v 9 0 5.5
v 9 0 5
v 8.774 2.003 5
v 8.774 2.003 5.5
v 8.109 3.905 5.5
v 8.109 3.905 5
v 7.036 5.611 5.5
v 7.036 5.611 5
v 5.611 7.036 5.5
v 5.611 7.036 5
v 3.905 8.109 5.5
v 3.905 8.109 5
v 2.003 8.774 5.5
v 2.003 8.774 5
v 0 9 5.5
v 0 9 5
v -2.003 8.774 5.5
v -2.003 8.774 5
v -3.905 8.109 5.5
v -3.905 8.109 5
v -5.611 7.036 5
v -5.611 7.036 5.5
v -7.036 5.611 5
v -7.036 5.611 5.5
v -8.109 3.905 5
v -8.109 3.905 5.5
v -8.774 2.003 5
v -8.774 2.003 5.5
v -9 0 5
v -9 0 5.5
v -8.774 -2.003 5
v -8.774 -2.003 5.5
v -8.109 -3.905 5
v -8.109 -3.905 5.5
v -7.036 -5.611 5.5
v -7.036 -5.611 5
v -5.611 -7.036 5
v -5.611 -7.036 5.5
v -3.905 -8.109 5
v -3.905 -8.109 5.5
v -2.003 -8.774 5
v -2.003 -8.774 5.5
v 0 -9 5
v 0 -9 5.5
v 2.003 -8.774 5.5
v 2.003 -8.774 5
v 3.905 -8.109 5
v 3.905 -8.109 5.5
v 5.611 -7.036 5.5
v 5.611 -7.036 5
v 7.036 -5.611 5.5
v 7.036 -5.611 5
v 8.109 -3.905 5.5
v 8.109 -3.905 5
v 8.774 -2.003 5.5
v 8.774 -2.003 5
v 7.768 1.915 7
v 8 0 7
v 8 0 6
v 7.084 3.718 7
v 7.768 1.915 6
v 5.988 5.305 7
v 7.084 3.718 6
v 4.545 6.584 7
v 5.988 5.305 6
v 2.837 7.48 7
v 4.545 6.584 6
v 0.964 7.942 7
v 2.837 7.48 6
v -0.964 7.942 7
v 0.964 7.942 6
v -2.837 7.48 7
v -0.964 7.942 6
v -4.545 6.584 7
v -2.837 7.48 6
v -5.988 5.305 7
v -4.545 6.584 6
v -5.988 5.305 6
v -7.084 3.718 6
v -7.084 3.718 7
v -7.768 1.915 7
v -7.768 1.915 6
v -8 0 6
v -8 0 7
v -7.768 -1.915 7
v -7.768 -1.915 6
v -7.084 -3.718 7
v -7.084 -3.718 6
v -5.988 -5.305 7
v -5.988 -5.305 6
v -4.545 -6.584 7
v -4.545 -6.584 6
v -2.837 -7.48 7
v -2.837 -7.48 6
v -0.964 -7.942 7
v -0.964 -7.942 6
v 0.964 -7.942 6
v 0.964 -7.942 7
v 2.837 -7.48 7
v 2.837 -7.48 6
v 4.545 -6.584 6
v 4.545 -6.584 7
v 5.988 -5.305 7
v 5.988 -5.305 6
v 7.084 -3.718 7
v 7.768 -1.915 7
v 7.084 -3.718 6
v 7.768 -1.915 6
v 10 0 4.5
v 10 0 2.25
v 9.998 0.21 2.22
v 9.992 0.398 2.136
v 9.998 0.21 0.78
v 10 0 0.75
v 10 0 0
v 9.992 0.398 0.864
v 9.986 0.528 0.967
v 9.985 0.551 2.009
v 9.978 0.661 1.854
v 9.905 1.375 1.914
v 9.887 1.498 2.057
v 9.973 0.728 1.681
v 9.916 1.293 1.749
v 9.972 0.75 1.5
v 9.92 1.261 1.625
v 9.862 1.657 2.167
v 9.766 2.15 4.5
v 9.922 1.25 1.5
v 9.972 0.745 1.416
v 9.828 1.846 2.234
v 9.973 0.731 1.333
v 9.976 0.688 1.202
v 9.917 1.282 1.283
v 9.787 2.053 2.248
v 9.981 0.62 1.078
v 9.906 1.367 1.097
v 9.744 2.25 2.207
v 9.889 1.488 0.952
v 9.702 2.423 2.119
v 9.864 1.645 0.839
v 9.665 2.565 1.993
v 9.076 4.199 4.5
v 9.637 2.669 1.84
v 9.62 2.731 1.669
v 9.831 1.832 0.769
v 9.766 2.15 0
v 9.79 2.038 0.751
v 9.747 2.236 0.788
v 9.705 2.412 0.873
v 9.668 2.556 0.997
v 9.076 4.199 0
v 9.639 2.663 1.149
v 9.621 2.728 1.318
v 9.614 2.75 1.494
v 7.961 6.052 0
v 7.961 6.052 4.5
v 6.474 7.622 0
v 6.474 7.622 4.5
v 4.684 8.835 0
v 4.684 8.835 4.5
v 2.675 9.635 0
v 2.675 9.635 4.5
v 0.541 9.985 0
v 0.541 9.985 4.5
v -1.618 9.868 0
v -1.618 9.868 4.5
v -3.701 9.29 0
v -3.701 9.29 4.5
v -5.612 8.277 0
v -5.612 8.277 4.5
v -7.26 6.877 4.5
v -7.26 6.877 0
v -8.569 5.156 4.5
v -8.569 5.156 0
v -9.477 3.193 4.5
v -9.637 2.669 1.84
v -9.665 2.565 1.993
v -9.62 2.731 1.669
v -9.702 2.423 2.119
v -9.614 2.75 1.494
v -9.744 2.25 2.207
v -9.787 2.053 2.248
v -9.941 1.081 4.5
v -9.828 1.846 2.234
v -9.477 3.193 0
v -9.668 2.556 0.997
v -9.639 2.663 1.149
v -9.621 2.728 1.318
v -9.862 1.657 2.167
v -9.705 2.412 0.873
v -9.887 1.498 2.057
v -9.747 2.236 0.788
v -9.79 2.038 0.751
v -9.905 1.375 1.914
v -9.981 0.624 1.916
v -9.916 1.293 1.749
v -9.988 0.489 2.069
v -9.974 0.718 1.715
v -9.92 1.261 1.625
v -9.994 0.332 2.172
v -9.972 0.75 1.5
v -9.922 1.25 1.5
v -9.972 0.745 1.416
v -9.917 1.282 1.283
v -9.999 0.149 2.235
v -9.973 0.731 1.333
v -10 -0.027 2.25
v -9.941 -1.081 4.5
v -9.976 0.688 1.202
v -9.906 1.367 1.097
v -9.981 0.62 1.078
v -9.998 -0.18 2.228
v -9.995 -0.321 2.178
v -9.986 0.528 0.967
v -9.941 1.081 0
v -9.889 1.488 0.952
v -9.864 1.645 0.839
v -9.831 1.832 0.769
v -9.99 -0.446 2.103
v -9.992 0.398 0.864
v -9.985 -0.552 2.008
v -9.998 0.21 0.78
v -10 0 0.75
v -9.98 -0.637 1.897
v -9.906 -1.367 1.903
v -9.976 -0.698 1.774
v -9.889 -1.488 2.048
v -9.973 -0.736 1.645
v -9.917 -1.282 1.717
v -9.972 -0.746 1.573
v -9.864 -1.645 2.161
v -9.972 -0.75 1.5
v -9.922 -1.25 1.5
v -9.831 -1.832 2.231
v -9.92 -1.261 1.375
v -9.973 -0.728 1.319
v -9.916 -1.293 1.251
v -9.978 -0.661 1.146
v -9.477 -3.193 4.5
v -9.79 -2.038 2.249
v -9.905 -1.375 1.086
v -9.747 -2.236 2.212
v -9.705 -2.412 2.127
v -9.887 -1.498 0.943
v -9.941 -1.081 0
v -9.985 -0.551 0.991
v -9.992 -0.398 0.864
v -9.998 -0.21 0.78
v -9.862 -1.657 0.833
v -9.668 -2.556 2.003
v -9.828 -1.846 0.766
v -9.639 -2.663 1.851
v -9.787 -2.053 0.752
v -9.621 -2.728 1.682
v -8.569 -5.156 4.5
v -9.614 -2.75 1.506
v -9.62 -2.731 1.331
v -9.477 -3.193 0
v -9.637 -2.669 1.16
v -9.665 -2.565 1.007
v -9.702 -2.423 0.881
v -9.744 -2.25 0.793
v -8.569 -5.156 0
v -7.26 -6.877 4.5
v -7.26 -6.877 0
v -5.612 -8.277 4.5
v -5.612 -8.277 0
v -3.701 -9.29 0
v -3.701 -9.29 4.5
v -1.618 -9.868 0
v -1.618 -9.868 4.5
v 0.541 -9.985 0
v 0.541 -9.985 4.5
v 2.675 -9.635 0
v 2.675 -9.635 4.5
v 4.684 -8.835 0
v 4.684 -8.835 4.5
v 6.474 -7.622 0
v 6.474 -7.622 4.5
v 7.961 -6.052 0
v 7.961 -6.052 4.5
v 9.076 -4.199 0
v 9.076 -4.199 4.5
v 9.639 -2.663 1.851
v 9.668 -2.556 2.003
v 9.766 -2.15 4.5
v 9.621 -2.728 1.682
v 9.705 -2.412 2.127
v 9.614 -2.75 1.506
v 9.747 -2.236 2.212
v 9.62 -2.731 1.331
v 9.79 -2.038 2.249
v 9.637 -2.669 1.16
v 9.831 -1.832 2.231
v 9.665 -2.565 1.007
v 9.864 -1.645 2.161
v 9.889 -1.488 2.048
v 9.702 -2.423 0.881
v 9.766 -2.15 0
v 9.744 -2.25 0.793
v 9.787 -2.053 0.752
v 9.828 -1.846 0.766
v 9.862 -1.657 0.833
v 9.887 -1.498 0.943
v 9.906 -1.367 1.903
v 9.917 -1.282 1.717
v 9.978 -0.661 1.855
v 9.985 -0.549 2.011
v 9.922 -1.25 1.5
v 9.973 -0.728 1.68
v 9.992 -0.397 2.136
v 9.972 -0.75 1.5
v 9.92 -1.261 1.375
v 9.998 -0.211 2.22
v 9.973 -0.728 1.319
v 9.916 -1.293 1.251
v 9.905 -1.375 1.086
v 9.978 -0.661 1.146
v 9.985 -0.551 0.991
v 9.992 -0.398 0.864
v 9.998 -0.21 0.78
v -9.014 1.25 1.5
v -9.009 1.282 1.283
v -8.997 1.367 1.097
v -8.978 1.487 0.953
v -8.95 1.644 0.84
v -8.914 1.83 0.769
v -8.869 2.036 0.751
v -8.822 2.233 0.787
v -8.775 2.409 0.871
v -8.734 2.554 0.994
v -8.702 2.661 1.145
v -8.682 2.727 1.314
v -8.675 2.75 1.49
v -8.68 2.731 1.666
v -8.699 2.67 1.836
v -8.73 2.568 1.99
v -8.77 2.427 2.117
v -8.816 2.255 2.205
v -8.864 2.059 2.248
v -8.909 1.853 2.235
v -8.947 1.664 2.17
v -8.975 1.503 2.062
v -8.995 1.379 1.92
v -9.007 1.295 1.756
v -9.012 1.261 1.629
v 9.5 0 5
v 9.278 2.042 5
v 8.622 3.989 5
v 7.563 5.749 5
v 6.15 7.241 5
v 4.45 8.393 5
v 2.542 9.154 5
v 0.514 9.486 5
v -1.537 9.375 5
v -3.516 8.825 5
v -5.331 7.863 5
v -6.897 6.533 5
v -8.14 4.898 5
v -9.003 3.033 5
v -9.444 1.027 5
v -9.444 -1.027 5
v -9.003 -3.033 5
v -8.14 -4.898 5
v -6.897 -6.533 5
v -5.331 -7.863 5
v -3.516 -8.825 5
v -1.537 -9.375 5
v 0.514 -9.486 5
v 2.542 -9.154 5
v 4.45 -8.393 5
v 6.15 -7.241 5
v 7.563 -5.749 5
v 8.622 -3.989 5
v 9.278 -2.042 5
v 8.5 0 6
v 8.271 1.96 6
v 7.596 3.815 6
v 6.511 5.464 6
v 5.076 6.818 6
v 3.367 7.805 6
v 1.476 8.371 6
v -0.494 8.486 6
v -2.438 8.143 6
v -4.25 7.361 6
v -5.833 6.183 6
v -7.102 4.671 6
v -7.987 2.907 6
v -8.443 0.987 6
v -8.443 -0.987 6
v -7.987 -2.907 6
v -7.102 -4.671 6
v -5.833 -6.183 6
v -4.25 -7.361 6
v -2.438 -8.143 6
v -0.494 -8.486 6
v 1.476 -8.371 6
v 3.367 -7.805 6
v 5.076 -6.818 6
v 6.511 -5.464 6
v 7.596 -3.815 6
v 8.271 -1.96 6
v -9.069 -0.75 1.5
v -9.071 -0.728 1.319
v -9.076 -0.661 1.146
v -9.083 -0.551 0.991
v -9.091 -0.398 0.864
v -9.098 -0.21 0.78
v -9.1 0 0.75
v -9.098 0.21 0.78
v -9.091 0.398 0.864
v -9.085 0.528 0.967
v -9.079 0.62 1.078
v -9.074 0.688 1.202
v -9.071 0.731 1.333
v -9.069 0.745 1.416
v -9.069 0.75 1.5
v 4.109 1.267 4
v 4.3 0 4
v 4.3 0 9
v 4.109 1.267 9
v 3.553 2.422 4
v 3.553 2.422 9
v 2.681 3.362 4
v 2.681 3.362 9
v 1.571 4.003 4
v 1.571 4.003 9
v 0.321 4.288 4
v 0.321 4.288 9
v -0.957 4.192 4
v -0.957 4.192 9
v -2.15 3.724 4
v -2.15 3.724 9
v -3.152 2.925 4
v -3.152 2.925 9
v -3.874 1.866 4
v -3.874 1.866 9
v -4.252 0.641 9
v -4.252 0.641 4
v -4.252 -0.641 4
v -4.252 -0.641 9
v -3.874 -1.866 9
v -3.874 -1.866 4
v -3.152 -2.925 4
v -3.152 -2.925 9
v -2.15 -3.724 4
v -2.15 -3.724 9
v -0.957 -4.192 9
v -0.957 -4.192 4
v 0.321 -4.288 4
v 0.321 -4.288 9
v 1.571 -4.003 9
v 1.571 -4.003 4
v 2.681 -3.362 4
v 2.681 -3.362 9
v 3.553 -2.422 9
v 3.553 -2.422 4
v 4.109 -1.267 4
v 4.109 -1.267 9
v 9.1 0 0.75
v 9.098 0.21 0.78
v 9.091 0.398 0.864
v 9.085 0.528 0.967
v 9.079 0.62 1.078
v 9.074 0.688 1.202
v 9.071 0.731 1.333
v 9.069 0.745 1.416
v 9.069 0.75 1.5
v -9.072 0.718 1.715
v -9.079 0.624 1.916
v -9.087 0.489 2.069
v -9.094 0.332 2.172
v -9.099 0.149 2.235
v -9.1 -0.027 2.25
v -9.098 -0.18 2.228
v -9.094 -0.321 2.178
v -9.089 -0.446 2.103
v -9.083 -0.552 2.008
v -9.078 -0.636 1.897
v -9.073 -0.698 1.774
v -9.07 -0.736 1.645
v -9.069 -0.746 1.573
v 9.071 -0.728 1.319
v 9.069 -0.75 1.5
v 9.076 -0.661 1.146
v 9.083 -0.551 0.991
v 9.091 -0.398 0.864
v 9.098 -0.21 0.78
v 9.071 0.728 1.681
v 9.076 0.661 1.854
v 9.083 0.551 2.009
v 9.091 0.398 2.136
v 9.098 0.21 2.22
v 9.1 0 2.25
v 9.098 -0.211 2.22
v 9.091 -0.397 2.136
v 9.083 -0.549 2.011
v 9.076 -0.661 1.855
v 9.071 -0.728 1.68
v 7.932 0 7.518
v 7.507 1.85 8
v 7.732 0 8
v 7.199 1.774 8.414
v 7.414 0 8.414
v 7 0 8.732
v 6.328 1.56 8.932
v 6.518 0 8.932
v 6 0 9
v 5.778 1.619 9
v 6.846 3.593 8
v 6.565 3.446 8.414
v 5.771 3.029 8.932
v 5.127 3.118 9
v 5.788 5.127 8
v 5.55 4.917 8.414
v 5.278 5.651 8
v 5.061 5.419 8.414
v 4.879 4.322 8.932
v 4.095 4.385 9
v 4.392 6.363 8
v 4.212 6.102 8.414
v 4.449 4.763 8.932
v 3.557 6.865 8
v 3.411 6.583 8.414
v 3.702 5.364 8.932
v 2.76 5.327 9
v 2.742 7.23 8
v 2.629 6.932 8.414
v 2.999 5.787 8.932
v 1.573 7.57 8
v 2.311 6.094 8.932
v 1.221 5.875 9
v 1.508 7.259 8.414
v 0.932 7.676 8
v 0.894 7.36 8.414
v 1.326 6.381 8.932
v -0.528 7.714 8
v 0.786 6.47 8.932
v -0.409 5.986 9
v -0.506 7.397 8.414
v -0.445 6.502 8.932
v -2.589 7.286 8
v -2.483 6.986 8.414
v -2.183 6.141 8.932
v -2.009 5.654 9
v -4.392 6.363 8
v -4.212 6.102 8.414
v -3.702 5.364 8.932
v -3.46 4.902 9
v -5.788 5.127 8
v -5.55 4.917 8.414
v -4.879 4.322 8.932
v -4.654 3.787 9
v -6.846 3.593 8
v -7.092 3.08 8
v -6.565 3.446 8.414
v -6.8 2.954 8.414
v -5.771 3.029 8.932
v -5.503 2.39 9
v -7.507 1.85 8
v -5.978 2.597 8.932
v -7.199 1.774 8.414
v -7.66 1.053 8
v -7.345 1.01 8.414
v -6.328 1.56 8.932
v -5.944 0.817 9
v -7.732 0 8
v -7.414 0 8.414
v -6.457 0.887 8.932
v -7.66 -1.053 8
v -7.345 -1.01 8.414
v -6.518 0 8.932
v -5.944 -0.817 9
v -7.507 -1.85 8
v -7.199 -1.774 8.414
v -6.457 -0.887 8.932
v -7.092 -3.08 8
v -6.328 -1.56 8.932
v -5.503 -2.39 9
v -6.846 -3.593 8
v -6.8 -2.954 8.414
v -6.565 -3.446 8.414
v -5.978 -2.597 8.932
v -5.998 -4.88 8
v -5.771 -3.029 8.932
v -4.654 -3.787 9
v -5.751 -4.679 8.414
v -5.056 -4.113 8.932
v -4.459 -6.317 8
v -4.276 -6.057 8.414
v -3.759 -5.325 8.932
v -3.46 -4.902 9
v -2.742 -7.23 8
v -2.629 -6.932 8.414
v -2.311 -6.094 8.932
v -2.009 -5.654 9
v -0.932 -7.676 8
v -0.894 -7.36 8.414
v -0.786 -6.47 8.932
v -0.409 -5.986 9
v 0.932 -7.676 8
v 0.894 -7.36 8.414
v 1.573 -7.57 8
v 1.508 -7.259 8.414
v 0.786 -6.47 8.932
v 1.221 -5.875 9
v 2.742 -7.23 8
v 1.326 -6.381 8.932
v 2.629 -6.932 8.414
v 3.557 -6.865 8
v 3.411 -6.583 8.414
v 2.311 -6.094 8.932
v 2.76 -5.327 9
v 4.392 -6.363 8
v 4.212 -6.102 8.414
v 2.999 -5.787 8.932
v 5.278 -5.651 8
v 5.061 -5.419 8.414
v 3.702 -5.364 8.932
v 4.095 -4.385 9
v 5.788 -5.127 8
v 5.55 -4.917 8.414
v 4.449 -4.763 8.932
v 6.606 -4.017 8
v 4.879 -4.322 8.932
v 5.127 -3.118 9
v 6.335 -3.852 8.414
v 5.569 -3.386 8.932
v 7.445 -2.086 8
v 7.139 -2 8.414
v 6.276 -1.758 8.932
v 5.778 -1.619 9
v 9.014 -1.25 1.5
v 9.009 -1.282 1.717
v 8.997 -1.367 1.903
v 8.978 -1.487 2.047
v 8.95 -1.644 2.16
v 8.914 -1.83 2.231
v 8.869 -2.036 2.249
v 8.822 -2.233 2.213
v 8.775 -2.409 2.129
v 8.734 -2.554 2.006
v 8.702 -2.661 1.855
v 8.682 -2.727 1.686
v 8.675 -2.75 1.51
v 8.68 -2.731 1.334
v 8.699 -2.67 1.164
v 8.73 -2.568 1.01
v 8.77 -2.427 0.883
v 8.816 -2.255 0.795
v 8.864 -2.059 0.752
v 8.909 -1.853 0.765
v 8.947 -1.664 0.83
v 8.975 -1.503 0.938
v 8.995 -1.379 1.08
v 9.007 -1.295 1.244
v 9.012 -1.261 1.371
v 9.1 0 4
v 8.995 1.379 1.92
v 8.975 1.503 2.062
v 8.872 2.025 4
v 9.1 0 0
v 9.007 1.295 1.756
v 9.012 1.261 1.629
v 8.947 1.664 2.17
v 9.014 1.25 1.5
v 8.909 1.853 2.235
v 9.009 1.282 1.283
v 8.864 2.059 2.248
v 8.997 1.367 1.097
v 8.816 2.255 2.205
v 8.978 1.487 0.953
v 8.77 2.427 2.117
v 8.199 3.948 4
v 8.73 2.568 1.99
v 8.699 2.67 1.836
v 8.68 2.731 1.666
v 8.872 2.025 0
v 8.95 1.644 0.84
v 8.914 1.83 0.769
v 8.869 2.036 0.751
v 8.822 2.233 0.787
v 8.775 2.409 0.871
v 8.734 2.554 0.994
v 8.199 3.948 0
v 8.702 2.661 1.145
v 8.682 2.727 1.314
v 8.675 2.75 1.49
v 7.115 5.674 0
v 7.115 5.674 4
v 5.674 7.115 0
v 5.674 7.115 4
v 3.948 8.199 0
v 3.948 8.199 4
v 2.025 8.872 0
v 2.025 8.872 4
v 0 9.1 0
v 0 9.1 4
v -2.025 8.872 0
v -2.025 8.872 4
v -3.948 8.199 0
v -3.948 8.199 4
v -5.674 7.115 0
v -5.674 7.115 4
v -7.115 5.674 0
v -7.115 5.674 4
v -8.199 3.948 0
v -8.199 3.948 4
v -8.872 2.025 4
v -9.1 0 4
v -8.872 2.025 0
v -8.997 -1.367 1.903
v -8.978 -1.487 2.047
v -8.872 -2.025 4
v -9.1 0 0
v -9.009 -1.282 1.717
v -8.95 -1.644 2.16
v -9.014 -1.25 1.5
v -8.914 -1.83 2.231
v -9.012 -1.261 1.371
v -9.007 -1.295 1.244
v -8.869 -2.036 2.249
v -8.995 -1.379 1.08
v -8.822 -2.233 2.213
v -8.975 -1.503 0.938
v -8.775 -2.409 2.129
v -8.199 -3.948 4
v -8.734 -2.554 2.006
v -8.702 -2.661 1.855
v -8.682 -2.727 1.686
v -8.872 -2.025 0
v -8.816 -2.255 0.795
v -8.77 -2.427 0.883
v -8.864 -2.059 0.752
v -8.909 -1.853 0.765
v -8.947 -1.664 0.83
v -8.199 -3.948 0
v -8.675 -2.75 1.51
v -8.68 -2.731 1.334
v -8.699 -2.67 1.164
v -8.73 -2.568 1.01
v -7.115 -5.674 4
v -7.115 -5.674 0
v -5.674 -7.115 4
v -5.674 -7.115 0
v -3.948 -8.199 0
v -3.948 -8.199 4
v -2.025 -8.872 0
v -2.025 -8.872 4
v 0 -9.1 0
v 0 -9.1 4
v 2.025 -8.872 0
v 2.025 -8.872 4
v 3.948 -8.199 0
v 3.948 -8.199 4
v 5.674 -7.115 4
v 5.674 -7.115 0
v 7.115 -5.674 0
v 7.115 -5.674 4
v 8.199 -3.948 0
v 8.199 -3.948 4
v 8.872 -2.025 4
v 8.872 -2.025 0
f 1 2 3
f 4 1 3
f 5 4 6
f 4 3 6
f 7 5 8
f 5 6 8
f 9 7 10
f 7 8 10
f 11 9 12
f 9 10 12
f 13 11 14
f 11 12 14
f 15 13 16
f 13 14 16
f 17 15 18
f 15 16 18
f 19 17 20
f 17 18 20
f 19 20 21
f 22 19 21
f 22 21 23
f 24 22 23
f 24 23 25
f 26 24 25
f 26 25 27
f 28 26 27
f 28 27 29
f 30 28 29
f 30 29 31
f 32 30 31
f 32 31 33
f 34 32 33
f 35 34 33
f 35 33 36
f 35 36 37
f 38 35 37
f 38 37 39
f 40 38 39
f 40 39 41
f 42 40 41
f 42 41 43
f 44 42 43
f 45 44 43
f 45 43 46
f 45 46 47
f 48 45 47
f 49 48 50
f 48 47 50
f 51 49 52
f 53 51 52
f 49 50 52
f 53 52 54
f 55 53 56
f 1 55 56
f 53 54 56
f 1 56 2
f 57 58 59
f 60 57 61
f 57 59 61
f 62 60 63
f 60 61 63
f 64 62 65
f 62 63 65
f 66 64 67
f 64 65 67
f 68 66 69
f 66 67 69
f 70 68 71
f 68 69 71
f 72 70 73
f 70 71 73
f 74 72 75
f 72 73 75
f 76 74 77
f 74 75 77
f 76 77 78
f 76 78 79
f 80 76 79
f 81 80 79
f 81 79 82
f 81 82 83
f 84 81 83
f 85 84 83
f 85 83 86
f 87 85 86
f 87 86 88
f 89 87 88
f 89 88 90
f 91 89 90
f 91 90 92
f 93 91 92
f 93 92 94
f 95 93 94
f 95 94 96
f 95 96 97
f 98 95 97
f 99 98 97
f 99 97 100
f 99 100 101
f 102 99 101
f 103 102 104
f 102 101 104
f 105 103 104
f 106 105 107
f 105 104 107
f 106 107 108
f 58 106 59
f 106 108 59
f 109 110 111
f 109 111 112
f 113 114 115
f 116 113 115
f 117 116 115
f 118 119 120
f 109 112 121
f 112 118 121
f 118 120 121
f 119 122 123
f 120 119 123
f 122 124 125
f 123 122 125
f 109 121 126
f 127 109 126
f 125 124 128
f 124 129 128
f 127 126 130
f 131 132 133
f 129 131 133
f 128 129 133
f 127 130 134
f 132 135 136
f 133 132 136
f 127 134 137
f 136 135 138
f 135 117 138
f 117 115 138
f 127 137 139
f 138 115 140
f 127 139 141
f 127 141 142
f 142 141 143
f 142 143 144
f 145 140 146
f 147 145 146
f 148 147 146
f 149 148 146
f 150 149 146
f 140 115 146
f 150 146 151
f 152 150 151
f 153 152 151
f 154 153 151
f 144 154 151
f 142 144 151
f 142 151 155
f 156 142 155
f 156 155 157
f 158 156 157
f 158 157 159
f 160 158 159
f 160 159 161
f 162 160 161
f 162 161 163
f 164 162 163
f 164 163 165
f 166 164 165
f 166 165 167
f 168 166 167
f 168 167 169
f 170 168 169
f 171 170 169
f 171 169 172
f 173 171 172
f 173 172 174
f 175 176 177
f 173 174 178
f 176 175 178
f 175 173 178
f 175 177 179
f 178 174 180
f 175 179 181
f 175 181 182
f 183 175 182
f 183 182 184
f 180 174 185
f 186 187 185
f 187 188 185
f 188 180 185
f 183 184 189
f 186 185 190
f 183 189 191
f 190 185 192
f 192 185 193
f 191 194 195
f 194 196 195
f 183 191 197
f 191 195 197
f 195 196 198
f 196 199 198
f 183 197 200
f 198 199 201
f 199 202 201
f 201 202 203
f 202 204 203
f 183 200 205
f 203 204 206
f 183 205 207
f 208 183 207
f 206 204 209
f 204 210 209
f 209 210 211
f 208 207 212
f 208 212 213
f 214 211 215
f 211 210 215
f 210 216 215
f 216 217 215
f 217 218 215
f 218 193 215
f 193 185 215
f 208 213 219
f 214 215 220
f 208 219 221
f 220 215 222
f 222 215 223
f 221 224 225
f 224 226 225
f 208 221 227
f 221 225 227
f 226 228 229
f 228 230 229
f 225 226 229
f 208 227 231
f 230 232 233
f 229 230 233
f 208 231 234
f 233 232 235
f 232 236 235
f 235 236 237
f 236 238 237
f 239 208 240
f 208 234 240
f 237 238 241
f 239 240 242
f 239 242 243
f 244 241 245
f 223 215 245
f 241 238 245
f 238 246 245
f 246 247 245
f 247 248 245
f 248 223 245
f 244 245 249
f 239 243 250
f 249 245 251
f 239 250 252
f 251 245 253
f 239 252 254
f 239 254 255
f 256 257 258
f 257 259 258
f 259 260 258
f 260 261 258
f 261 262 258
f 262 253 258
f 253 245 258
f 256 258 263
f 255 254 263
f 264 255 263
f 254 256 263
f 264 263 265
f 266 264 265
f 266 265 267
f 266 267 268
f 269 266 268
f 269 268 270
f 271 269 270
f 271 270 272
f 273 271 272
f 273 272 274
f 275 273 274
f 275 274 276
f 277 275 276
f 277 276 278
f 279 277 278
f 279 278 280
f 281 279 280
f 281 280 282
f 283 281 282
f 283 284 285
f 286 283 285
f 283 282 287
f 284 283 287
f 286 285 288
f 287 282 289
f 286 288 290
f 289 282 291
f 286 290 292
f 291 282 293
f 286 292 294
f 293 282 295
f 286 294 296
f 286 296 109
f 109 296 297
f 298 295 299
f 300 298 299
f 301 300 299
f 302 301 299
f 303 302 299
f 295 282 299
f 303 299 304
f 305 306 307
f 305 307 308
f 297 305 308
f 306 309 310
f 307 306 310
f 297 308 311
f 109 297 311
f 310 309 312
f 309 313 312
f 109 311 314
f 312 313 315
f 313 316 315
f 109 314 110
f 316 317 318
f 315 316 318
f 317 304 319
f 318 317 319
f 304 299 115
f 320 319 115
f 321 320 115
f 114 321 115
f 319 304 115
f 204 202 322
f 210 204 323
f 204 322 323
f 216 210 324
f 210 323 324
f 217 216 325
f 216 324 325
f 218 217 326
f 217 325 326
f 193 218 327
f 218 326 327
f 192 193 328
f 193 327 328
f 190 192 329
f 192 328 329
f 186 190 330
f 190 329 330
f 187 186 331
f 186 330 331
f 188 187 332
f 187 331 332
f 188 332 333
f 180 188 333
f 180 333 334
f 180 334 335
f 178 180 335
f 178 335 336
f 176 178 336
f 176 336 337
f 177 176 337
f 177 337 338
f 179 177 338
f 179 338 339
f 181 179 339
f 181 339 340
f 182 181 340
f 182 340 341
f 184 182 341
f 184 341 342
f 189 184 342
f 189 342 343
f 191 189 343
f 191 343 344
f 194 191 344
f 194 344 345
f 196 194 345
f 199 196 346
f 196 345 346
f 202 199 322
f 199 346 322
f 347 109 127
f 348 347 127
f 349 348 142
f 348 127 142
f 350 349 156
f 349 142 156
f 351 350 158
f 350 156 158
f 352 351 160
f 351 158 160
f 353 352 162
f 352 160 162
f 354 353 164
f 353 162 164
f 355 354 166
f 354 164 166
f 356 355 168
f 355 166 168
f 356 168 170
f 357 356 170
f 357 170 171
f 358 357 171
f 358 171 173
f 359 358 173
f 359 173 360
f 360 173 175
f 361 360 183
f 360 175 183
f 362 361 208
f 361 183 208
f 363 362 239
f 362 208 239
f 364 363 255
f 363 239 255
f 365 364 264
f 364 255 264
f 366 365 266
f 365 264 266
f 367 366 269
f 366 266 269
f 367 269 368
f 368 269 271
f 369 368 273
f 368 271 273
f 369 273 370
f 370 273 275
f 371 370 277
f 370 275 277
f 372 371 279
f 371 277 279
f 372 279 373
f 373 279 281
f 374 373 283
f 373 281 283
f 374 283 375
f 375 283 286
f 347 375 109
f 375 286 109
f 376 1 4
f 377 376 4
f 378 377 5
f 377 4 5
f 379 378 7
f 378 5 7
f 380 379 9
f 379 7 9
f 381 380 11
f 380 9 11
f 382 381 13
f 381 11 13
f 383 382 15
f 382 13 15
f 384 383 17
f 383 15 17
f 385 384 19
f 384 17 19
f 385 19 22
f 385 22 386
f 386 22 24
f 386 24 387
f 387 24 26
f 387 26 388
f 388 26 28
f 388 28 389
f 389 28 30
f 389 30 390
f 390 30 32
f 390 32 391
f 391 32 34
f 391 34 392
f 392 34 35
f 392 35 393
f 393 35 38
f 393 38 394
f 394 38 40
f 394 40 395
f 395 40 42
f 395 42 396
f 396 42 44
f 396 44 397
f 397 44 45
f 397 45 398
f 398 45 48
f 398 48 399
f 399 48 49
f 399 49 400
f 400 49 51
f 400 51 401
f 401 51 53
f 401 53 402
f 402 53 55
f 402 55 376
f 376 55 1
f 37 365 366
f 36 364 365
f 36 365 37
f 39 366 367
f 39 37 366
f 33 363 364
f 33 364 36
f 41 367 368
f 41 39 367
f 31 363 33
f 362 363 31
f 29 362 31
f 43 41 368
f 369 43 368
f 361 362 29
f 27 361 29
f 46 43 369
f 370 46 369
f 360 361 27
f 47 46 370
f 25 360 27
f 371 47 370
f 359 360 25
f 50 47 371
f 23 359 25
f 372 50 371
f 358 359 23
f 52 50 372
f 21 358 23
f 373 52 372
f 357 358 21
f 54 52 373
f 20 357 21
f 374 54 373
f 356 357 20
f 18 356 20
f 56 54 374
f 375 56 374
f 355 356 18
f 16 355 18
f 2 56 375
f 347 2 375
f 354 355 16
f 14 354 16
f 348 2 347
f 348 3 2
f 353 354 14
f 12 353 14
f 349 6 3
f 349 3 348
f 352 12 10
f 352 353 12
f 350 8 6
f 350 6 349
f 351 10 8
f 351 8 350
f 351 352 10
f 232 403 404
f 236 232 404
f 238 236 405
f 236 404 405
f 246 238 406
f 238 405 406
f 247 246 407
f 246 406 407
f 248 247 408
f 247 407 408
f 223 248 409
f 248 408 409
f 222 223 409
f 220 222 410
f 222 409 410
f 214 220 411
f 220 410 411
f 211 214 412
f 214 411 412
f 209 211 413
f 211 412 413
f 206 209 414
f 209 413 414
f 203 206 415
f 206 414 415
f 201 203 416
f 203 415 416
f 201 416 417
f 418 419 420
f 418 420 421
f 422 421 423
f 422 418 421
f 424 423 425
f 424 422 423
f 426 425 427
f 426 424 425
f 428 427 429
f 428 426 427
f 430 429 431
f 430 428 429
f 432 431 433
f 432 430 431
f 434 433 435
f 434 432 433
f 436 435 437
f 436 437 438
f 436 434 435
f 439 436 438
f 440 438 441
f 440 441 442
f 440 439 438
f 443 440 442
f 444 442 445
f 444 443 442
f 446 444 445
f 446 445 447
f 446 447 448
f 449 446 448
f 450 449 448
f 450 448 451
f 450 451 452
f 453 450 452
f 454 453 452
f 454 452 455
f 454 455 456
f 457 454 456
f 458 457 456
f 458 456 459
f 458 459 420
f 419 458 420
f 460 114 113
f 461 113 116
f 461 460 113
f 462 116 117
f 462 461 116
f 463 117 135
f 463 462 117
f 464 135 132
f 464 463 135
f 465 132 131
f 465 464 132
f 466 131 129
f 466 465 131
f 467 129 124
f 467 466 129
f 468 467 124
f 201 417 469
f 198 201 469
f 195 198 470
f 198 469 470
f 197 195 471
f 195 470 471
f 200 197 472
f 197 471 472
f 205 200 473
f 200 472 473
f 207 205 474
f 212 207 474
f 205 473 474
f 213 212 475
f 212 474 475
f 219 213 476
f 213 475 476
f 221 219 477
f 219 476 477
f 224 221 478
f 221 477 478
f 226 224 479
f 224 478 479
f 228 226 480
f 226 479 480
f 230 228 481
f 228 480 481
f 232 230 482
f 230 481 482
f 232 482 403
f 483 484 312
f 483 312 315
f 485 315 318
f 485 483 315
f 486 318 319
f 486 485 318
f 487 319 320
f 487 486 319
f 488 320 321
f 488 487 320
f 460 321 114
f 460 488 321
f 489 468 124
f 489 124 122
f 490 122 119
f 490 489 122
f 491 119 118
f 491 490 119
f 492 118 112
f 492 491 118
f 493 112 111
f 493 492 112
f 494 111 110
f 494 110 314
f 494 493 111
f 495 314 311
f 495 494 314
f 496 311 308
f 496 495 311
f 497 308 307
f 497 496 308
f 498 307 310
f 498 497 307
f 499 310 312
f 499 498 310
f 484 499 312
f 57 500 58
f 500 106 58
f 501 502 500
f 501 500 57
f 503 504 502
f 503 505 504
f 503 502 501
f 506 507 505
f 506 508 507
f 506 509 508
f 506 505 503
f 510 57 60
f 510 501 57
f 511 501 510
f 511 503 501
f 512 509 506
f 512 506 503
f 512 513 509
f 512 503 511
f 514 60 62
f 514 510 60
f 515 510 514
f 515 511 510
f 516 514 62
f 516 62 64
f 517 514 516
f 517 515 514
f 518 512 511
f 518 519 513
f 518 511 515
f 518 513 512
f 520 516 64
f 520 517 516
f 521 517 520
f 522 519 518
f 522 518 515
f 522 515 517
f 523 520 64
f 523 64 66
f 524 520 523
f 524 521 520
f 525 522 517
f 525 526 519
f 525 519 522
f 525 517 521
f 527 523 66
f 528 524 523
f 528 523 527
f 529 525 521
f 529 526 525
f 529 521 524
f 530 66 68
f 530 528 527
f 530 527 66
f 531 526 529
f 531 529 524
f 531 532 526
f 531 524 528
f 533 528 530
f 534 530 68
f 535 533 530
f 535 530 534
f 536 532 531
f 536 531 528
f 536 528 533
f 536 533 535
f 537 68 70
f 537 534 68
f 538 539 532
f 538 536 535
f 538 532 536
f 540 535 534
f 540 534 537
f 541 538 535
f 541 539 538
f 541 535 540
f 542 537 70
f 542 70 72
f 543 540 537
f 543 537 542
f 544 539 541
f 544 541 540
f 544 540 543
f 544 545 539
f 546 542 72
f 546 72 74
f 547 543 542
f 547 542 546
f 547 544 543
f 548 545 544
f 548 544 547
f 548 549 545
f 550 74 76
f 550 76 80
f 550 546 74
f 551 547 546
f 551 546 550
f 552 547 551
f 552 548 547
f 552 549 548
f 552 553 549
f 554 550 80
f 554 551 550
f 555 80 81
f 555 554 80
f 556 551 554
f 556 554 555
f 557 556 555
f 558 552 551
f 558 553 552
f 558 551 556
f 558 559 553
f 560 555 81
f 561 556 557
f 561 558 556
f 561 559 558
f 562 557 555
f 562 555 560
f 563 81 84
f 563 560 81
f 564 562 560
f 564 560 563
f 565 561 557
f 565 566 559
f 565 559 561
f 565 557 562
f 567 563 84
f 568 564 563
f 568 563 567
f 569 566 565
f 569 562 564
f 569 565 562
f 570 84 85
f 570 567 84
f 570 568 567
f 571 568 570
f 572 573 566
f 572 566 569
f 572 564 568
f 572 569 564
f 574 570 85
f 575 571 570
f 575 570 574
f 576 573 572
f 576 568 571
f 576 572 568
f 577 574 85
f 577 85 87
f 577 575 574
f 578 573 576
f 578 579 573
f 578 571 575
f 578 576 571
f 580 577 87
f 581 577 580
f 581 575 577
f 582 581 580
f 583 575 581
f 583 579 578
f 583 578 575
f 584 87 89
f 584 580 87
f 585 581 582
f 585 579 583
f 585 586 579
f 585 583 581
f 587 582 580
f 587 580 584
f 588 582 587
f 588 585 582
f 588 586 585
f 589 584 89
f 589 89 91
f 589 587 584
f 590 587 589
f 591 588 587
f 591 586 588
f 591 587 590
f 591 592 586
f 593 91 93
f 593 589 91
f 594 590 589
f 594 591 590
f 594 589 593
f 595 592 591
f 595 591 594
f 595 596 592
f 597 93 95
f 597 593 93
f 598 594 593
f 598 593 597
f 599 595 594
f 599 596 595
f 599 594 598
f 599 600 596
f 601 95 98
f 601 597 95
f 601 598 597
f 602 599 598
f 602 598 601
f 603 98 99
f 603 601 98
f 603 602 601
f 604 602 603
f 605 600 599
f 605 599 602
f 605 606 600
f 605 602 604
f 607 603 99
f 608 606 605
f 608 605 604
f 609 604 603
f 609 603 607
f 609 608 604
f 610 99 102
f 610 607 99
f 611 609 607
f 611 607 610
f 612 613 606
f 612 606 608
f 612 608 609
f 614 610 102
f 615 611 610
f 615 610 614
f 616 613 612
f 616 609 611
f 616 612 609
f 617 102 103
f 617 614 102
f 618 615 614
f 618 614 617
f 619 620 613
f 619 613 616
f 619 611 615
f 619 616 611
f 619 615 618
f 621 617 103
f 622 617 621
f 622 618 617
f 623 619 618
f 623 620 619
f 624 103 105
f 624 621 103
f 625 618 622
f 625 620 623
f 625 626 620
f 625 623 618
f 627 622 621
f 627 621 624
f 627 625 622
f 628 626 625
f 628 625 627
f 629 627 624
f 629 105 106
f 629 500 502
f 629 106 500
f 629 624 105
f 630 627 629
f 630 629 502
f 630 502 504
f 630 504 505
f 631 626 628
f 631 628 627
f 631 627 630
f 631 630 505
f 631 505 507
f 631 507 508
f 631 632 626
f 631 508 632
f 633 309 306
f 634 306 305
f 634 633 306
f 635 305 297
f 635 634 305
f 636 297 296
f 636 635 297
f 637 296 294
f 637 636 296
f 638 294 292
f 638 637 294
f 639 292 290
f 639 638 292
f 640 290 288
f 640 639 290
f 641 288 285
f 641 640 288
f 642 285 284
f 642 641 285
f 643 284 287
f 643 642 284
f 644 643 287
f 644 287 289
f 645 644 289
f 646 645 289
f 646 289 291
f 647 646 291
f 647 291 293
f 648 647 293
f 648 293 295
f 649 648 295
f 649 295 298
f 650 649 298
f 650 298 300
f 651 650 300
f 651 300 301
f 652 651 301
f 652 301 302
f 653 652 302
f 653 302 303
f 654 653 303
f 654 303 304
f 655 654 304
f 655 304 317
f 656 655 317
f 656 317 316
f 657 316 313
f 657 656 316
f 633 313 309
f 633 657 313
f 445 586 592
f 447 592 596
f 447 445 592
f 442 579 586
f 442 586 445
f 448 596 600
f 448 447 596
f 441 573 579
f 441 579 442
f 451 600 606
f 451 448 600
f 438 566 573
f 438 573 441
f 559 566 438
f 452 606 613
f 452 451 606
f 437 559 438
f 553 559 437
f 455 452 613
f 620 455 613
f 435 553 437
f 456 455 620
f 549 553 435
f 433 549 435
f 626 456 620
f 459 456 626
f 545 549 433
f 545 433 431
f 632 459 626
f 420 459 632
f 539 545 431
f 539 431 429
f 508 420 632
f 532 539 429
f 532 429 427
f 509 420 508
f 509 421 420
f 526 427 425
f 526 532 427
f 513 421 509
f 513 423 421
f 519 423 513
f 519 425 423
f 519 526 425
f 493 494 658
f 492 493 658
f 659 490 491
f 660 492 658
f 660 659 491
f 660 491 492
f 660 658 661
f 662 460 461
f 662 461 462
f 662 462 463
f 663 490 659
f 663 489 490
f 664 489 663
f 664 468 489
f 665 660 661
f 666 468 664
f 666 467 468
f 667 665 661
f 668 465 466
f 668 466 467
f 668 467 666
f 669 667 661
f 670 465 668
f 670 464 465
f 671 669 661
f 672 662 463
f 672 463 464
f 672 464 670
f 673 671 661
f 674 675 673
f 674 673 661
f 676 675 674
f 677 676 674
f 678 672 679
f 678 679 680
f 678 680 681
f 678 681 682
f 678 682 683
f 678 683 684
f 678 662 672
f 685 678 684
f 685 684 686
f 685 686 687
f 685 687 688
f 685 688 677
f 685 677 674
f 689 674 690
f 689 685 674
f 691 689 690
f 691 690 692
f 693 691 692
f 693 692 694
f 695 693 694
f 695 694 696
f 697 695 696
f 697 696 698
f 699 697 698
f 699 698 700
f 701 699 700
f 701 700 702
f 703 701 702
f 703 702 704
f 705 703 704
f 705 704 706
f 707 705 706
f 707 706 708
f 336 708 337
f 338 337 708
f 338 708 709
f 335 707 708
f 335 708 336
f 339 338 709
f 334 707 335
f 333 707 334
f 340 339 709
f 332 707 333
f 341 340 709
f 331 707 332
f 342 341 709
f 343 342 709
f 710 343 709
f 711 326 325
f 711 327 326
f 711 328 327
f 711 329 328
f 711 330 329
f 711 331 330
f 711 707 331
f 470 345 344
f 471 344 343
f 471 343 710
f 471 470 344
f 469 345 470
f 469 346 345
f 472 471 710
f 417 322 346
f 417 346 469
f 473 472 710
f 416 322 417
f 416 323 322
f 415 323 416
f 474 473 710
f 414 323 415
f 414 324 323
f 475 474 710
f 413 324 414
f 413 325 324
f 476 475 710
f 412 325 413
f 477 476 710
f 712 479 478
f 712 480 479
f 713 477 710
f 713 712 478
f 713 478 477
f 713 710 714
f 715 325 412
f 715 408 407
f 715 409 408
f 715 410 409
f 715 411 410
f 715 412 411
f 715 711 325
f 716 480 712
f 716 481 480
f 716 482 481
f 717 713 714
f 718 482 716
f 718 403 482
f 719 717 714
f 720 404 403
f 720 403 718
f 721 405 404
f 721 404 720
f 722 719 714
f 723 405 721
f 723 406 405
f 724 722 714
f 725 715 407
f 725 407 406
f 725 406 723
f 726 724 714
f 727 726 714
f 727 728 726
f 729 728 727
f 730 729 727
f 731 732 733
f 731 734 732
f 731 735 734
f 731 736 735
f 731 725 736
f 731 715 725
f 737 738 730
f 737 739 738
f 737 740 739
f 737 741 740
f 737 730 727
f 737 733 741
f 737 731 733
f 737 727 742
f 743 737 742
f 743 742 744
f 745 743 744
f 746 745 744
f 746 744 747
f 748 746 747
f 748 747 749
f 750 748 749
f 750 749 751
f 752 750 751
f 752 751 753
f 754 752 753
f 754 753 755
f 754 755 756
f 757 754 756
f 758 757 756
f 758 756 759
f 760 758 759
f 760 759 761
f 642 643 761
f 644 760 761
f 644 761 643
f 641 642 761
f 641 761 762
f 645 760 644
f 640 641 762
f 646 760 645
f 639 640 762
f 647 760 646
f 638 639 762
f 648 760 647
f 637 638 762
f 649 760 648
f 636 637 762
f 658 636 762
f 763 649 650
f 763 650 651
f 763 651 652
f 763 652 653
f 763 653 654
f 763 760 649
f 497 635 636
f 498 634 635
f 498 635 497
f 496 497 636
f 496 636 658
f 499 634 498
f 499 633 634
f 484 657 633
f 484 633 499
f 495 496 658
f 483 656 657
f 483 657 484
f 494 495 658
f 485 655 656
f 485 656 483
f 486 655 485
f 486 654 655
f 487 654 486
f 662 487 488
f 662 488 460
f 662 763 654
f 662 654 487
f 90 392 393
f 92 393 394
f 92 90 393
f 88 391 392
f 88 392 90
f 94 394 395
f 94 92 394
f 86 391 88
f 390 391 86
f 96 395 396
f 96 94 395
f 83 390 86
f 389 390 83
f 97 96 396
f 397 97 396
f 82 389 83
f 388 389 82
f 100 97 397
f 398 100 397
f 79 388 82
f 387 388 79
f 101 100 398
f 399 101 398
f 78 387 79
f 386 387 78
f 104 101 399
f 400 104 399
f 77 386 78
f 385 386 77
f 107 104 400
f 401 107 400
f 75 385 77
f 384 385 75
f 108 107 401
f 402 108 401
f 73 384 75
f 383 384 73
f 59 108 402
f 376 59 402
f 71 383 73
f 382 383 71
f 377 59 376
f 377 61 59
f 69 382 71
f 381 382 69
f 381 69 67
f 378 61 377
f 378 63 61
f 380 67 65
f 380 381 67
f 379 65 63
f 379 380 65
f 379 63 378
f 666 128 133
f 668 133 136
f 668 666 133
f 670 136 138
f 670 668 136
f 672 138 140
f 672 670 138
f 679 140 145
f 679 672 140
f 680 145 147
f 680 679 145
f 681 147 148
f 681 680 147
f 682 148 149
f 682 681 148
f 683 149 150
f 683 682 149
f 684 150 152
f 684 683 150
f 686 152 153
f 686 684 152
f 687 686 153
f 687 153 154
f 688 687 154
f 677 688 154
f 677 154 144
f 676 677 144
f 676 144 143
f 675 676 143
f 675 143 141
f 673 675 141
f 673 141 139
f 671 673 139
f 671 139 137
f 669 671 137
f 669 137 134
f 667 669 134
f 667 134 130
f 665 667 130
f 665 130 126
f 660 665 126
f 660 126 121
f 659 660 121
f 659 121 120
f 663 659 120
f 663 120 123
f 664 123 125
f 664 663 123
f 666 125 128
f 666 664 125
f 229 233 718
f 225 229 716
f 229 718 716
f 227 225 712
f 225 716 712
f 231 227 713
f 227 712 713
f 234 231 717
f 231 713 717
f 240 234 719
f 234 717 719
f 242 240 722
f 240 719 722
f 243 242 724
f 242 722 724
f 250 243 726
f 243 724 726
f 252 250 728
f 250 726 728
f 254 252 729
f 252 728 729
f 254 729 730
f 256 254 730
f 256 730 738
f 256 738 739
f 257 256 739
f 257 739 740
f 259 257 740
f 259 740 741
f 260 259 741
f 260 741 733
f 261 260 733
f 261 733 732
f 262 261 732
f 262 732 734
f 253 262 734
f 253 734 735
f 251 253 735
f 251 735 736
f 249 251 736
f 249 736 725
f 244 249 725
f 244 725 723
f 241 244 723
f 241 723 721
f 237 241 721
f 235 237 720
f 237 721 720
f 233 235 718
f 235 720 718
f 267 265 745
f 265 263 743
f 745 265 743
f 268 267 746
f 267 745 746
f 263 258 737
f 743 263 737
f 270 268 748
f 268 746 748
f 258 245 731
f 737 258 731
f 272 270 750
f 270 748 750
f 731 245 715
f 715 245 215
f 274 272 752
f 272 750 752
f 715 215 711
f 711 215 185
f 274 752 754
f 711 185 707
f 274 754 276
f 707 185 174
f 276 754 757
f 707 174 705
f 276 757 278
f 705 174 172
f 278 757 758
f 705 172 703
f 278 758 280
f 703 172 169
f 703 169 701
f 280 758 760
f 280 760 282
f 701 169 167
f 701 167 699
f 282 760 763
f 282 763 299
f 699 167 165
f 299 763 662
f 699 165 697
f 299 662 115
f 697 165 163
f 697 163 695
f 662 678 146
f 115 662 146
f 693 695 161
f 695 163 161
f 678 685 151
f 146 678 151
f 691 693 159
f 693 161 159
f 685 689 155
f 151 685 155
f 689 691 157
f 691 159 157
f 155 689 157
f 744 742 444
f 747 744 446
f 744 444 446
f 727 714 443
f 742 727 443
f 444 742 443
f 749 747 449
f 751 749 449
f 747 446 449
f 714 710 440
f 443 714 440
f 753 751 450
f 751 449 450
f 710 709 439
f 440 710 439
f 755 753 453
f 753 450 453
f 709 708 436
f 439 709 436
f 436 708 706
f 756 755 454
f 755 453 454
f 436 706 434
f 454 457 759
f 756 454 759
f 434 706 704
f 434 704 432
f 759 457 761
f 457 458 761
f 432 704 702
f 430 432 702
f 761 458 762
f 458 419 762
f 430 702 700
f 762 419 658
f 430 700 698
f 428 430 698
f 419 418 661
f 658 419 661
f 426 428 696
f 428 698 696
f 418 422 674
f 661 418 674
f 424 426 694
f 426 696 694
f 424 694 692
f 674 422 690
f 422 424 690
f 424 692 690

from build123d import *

# Parameters (mm, degrees)
F0_R          = 10
F0_R_2        = 9.1
F1_DEPTH      = 4
F2_R          = 0.75
F3_DEPTH      = 25
F3_DEPTH_BACK = 25
F4_R          = 10
F4_R_2        = 9.1
F4_R_3        = 9
F4_R_4        = 8
F4_R_5        = 4.3
F5_DEPTH      = 1
F6_DEPTH      = 2
F7_DEPTH      = 5
F8_SIZE       = 0.5
F9_R          = 2


with BuildPart() as f1:
    # F0 (on Top) → F1 (new body)
    with BuildSketch(Plane.XY):
        Circle(F0_R)
        Circle(F0_R_2, mode=Mode.SUBTRACT)
    extrude(amount=F1_DEPTH)

    # F2 (on Right) → F3 (cut, two sides)
    with BuildSketch(Plane.YZ) as f3_sk:
        with BuildLine():
            ThreePointArc((-0.75, 1.5), (-0.5303300859, 0.9696699141), (0, 0.75))
            Line((0, 0.75), (0, 1.5))
            Line((0, 1.5), (-0.75, 1.5))
        make_face()
        with BuildLine():
            Line((0, 1.5), (0, 0.75))
            ThreePointArc((0, 0.75), (0.5303300859, 0.9696699141), (0.75, 1.5))
            Line((0.75, 1.5), (0, 1.5))
        make_face()
        with BuildLine():
            Line((-0.75, 1.5), (0, 1.5))
            Line((0, 1.5), (0.75, 1.5))
            ThreePointArc((0.75, 1.5), (0, 2.25), (-0.75, 1.5))
        make_face()
        with Locations((-2, 1.5)):
            Circle(F2_R)
        with BuildLine():
            ThreePointArc((2.75, 1.5), (2, 2.25), (1.25, 1.5))
            ThreePointArc((1.25, 1.5), (2, 0.75), (2.75, 1.5))
        make_face()
    extrude(amount=-F3_DEPTH, mode=Mode.SUBTRACT)
    extrude(f3_sk.sketch, amount=F3_DEPTH_BACK, mode=Mode.SUBTRACT)

    # F4 (on face) → F5 (join)
    with BuildSketch(Plane.XY.offset(4)):
        Circle(F4_R)
        Circle(F4_R_2, mode=Mode.SUBTRACT)
        Circle(F4_R_2)
        Circle(F4_R_3, mode=Mode.SUBTRACT)
        Circle(F4_R_3)
        Circle(F4_R_4, mode=Mode.SUBTRACT)
        Circle(F4_R_4)
        Circle(F4_R_5, mode=Mode.SUBTRACT)
    extrude(amount=F5_DEPTH)

    # F4 (on face) → F6 (join)
    with BuildSketch(Plane.XY.offset(4)):
        Circle(F4_R_3)
        Circle(F4_R_4, mode=Mode.SUBTRACT)
        Circle(F4_R_4)
        Circle(F4_R_5, mode=Mode.SUBTRACT)
    extrude(amount=F6_DEPTH)

    # F4 (on face) → F7 (join)
    with BuildSketch(Plane.XY.offset(4)):
        Circle(F4_R_4)
        Circle(F4_R_5, mode=Mode.SUBTRACT)
    extrude(amount=F7_DEPTH)

    # F8
    f8_edges = [f1.edges().sort_by_distance(p)[0] for p in [
        (-10, 0, 5),
        (-9, 0, 6),
    ]]
    chamfer(f8_edges, length=F8_SIZE)

    # F9
    f9_edges = [f1.edges().sort_by_distance(p)[0] for p in [
        (-8, 0, 9),
    ]]
    fillet(f9_edges, radius=F9_R)


solid = f1.part
